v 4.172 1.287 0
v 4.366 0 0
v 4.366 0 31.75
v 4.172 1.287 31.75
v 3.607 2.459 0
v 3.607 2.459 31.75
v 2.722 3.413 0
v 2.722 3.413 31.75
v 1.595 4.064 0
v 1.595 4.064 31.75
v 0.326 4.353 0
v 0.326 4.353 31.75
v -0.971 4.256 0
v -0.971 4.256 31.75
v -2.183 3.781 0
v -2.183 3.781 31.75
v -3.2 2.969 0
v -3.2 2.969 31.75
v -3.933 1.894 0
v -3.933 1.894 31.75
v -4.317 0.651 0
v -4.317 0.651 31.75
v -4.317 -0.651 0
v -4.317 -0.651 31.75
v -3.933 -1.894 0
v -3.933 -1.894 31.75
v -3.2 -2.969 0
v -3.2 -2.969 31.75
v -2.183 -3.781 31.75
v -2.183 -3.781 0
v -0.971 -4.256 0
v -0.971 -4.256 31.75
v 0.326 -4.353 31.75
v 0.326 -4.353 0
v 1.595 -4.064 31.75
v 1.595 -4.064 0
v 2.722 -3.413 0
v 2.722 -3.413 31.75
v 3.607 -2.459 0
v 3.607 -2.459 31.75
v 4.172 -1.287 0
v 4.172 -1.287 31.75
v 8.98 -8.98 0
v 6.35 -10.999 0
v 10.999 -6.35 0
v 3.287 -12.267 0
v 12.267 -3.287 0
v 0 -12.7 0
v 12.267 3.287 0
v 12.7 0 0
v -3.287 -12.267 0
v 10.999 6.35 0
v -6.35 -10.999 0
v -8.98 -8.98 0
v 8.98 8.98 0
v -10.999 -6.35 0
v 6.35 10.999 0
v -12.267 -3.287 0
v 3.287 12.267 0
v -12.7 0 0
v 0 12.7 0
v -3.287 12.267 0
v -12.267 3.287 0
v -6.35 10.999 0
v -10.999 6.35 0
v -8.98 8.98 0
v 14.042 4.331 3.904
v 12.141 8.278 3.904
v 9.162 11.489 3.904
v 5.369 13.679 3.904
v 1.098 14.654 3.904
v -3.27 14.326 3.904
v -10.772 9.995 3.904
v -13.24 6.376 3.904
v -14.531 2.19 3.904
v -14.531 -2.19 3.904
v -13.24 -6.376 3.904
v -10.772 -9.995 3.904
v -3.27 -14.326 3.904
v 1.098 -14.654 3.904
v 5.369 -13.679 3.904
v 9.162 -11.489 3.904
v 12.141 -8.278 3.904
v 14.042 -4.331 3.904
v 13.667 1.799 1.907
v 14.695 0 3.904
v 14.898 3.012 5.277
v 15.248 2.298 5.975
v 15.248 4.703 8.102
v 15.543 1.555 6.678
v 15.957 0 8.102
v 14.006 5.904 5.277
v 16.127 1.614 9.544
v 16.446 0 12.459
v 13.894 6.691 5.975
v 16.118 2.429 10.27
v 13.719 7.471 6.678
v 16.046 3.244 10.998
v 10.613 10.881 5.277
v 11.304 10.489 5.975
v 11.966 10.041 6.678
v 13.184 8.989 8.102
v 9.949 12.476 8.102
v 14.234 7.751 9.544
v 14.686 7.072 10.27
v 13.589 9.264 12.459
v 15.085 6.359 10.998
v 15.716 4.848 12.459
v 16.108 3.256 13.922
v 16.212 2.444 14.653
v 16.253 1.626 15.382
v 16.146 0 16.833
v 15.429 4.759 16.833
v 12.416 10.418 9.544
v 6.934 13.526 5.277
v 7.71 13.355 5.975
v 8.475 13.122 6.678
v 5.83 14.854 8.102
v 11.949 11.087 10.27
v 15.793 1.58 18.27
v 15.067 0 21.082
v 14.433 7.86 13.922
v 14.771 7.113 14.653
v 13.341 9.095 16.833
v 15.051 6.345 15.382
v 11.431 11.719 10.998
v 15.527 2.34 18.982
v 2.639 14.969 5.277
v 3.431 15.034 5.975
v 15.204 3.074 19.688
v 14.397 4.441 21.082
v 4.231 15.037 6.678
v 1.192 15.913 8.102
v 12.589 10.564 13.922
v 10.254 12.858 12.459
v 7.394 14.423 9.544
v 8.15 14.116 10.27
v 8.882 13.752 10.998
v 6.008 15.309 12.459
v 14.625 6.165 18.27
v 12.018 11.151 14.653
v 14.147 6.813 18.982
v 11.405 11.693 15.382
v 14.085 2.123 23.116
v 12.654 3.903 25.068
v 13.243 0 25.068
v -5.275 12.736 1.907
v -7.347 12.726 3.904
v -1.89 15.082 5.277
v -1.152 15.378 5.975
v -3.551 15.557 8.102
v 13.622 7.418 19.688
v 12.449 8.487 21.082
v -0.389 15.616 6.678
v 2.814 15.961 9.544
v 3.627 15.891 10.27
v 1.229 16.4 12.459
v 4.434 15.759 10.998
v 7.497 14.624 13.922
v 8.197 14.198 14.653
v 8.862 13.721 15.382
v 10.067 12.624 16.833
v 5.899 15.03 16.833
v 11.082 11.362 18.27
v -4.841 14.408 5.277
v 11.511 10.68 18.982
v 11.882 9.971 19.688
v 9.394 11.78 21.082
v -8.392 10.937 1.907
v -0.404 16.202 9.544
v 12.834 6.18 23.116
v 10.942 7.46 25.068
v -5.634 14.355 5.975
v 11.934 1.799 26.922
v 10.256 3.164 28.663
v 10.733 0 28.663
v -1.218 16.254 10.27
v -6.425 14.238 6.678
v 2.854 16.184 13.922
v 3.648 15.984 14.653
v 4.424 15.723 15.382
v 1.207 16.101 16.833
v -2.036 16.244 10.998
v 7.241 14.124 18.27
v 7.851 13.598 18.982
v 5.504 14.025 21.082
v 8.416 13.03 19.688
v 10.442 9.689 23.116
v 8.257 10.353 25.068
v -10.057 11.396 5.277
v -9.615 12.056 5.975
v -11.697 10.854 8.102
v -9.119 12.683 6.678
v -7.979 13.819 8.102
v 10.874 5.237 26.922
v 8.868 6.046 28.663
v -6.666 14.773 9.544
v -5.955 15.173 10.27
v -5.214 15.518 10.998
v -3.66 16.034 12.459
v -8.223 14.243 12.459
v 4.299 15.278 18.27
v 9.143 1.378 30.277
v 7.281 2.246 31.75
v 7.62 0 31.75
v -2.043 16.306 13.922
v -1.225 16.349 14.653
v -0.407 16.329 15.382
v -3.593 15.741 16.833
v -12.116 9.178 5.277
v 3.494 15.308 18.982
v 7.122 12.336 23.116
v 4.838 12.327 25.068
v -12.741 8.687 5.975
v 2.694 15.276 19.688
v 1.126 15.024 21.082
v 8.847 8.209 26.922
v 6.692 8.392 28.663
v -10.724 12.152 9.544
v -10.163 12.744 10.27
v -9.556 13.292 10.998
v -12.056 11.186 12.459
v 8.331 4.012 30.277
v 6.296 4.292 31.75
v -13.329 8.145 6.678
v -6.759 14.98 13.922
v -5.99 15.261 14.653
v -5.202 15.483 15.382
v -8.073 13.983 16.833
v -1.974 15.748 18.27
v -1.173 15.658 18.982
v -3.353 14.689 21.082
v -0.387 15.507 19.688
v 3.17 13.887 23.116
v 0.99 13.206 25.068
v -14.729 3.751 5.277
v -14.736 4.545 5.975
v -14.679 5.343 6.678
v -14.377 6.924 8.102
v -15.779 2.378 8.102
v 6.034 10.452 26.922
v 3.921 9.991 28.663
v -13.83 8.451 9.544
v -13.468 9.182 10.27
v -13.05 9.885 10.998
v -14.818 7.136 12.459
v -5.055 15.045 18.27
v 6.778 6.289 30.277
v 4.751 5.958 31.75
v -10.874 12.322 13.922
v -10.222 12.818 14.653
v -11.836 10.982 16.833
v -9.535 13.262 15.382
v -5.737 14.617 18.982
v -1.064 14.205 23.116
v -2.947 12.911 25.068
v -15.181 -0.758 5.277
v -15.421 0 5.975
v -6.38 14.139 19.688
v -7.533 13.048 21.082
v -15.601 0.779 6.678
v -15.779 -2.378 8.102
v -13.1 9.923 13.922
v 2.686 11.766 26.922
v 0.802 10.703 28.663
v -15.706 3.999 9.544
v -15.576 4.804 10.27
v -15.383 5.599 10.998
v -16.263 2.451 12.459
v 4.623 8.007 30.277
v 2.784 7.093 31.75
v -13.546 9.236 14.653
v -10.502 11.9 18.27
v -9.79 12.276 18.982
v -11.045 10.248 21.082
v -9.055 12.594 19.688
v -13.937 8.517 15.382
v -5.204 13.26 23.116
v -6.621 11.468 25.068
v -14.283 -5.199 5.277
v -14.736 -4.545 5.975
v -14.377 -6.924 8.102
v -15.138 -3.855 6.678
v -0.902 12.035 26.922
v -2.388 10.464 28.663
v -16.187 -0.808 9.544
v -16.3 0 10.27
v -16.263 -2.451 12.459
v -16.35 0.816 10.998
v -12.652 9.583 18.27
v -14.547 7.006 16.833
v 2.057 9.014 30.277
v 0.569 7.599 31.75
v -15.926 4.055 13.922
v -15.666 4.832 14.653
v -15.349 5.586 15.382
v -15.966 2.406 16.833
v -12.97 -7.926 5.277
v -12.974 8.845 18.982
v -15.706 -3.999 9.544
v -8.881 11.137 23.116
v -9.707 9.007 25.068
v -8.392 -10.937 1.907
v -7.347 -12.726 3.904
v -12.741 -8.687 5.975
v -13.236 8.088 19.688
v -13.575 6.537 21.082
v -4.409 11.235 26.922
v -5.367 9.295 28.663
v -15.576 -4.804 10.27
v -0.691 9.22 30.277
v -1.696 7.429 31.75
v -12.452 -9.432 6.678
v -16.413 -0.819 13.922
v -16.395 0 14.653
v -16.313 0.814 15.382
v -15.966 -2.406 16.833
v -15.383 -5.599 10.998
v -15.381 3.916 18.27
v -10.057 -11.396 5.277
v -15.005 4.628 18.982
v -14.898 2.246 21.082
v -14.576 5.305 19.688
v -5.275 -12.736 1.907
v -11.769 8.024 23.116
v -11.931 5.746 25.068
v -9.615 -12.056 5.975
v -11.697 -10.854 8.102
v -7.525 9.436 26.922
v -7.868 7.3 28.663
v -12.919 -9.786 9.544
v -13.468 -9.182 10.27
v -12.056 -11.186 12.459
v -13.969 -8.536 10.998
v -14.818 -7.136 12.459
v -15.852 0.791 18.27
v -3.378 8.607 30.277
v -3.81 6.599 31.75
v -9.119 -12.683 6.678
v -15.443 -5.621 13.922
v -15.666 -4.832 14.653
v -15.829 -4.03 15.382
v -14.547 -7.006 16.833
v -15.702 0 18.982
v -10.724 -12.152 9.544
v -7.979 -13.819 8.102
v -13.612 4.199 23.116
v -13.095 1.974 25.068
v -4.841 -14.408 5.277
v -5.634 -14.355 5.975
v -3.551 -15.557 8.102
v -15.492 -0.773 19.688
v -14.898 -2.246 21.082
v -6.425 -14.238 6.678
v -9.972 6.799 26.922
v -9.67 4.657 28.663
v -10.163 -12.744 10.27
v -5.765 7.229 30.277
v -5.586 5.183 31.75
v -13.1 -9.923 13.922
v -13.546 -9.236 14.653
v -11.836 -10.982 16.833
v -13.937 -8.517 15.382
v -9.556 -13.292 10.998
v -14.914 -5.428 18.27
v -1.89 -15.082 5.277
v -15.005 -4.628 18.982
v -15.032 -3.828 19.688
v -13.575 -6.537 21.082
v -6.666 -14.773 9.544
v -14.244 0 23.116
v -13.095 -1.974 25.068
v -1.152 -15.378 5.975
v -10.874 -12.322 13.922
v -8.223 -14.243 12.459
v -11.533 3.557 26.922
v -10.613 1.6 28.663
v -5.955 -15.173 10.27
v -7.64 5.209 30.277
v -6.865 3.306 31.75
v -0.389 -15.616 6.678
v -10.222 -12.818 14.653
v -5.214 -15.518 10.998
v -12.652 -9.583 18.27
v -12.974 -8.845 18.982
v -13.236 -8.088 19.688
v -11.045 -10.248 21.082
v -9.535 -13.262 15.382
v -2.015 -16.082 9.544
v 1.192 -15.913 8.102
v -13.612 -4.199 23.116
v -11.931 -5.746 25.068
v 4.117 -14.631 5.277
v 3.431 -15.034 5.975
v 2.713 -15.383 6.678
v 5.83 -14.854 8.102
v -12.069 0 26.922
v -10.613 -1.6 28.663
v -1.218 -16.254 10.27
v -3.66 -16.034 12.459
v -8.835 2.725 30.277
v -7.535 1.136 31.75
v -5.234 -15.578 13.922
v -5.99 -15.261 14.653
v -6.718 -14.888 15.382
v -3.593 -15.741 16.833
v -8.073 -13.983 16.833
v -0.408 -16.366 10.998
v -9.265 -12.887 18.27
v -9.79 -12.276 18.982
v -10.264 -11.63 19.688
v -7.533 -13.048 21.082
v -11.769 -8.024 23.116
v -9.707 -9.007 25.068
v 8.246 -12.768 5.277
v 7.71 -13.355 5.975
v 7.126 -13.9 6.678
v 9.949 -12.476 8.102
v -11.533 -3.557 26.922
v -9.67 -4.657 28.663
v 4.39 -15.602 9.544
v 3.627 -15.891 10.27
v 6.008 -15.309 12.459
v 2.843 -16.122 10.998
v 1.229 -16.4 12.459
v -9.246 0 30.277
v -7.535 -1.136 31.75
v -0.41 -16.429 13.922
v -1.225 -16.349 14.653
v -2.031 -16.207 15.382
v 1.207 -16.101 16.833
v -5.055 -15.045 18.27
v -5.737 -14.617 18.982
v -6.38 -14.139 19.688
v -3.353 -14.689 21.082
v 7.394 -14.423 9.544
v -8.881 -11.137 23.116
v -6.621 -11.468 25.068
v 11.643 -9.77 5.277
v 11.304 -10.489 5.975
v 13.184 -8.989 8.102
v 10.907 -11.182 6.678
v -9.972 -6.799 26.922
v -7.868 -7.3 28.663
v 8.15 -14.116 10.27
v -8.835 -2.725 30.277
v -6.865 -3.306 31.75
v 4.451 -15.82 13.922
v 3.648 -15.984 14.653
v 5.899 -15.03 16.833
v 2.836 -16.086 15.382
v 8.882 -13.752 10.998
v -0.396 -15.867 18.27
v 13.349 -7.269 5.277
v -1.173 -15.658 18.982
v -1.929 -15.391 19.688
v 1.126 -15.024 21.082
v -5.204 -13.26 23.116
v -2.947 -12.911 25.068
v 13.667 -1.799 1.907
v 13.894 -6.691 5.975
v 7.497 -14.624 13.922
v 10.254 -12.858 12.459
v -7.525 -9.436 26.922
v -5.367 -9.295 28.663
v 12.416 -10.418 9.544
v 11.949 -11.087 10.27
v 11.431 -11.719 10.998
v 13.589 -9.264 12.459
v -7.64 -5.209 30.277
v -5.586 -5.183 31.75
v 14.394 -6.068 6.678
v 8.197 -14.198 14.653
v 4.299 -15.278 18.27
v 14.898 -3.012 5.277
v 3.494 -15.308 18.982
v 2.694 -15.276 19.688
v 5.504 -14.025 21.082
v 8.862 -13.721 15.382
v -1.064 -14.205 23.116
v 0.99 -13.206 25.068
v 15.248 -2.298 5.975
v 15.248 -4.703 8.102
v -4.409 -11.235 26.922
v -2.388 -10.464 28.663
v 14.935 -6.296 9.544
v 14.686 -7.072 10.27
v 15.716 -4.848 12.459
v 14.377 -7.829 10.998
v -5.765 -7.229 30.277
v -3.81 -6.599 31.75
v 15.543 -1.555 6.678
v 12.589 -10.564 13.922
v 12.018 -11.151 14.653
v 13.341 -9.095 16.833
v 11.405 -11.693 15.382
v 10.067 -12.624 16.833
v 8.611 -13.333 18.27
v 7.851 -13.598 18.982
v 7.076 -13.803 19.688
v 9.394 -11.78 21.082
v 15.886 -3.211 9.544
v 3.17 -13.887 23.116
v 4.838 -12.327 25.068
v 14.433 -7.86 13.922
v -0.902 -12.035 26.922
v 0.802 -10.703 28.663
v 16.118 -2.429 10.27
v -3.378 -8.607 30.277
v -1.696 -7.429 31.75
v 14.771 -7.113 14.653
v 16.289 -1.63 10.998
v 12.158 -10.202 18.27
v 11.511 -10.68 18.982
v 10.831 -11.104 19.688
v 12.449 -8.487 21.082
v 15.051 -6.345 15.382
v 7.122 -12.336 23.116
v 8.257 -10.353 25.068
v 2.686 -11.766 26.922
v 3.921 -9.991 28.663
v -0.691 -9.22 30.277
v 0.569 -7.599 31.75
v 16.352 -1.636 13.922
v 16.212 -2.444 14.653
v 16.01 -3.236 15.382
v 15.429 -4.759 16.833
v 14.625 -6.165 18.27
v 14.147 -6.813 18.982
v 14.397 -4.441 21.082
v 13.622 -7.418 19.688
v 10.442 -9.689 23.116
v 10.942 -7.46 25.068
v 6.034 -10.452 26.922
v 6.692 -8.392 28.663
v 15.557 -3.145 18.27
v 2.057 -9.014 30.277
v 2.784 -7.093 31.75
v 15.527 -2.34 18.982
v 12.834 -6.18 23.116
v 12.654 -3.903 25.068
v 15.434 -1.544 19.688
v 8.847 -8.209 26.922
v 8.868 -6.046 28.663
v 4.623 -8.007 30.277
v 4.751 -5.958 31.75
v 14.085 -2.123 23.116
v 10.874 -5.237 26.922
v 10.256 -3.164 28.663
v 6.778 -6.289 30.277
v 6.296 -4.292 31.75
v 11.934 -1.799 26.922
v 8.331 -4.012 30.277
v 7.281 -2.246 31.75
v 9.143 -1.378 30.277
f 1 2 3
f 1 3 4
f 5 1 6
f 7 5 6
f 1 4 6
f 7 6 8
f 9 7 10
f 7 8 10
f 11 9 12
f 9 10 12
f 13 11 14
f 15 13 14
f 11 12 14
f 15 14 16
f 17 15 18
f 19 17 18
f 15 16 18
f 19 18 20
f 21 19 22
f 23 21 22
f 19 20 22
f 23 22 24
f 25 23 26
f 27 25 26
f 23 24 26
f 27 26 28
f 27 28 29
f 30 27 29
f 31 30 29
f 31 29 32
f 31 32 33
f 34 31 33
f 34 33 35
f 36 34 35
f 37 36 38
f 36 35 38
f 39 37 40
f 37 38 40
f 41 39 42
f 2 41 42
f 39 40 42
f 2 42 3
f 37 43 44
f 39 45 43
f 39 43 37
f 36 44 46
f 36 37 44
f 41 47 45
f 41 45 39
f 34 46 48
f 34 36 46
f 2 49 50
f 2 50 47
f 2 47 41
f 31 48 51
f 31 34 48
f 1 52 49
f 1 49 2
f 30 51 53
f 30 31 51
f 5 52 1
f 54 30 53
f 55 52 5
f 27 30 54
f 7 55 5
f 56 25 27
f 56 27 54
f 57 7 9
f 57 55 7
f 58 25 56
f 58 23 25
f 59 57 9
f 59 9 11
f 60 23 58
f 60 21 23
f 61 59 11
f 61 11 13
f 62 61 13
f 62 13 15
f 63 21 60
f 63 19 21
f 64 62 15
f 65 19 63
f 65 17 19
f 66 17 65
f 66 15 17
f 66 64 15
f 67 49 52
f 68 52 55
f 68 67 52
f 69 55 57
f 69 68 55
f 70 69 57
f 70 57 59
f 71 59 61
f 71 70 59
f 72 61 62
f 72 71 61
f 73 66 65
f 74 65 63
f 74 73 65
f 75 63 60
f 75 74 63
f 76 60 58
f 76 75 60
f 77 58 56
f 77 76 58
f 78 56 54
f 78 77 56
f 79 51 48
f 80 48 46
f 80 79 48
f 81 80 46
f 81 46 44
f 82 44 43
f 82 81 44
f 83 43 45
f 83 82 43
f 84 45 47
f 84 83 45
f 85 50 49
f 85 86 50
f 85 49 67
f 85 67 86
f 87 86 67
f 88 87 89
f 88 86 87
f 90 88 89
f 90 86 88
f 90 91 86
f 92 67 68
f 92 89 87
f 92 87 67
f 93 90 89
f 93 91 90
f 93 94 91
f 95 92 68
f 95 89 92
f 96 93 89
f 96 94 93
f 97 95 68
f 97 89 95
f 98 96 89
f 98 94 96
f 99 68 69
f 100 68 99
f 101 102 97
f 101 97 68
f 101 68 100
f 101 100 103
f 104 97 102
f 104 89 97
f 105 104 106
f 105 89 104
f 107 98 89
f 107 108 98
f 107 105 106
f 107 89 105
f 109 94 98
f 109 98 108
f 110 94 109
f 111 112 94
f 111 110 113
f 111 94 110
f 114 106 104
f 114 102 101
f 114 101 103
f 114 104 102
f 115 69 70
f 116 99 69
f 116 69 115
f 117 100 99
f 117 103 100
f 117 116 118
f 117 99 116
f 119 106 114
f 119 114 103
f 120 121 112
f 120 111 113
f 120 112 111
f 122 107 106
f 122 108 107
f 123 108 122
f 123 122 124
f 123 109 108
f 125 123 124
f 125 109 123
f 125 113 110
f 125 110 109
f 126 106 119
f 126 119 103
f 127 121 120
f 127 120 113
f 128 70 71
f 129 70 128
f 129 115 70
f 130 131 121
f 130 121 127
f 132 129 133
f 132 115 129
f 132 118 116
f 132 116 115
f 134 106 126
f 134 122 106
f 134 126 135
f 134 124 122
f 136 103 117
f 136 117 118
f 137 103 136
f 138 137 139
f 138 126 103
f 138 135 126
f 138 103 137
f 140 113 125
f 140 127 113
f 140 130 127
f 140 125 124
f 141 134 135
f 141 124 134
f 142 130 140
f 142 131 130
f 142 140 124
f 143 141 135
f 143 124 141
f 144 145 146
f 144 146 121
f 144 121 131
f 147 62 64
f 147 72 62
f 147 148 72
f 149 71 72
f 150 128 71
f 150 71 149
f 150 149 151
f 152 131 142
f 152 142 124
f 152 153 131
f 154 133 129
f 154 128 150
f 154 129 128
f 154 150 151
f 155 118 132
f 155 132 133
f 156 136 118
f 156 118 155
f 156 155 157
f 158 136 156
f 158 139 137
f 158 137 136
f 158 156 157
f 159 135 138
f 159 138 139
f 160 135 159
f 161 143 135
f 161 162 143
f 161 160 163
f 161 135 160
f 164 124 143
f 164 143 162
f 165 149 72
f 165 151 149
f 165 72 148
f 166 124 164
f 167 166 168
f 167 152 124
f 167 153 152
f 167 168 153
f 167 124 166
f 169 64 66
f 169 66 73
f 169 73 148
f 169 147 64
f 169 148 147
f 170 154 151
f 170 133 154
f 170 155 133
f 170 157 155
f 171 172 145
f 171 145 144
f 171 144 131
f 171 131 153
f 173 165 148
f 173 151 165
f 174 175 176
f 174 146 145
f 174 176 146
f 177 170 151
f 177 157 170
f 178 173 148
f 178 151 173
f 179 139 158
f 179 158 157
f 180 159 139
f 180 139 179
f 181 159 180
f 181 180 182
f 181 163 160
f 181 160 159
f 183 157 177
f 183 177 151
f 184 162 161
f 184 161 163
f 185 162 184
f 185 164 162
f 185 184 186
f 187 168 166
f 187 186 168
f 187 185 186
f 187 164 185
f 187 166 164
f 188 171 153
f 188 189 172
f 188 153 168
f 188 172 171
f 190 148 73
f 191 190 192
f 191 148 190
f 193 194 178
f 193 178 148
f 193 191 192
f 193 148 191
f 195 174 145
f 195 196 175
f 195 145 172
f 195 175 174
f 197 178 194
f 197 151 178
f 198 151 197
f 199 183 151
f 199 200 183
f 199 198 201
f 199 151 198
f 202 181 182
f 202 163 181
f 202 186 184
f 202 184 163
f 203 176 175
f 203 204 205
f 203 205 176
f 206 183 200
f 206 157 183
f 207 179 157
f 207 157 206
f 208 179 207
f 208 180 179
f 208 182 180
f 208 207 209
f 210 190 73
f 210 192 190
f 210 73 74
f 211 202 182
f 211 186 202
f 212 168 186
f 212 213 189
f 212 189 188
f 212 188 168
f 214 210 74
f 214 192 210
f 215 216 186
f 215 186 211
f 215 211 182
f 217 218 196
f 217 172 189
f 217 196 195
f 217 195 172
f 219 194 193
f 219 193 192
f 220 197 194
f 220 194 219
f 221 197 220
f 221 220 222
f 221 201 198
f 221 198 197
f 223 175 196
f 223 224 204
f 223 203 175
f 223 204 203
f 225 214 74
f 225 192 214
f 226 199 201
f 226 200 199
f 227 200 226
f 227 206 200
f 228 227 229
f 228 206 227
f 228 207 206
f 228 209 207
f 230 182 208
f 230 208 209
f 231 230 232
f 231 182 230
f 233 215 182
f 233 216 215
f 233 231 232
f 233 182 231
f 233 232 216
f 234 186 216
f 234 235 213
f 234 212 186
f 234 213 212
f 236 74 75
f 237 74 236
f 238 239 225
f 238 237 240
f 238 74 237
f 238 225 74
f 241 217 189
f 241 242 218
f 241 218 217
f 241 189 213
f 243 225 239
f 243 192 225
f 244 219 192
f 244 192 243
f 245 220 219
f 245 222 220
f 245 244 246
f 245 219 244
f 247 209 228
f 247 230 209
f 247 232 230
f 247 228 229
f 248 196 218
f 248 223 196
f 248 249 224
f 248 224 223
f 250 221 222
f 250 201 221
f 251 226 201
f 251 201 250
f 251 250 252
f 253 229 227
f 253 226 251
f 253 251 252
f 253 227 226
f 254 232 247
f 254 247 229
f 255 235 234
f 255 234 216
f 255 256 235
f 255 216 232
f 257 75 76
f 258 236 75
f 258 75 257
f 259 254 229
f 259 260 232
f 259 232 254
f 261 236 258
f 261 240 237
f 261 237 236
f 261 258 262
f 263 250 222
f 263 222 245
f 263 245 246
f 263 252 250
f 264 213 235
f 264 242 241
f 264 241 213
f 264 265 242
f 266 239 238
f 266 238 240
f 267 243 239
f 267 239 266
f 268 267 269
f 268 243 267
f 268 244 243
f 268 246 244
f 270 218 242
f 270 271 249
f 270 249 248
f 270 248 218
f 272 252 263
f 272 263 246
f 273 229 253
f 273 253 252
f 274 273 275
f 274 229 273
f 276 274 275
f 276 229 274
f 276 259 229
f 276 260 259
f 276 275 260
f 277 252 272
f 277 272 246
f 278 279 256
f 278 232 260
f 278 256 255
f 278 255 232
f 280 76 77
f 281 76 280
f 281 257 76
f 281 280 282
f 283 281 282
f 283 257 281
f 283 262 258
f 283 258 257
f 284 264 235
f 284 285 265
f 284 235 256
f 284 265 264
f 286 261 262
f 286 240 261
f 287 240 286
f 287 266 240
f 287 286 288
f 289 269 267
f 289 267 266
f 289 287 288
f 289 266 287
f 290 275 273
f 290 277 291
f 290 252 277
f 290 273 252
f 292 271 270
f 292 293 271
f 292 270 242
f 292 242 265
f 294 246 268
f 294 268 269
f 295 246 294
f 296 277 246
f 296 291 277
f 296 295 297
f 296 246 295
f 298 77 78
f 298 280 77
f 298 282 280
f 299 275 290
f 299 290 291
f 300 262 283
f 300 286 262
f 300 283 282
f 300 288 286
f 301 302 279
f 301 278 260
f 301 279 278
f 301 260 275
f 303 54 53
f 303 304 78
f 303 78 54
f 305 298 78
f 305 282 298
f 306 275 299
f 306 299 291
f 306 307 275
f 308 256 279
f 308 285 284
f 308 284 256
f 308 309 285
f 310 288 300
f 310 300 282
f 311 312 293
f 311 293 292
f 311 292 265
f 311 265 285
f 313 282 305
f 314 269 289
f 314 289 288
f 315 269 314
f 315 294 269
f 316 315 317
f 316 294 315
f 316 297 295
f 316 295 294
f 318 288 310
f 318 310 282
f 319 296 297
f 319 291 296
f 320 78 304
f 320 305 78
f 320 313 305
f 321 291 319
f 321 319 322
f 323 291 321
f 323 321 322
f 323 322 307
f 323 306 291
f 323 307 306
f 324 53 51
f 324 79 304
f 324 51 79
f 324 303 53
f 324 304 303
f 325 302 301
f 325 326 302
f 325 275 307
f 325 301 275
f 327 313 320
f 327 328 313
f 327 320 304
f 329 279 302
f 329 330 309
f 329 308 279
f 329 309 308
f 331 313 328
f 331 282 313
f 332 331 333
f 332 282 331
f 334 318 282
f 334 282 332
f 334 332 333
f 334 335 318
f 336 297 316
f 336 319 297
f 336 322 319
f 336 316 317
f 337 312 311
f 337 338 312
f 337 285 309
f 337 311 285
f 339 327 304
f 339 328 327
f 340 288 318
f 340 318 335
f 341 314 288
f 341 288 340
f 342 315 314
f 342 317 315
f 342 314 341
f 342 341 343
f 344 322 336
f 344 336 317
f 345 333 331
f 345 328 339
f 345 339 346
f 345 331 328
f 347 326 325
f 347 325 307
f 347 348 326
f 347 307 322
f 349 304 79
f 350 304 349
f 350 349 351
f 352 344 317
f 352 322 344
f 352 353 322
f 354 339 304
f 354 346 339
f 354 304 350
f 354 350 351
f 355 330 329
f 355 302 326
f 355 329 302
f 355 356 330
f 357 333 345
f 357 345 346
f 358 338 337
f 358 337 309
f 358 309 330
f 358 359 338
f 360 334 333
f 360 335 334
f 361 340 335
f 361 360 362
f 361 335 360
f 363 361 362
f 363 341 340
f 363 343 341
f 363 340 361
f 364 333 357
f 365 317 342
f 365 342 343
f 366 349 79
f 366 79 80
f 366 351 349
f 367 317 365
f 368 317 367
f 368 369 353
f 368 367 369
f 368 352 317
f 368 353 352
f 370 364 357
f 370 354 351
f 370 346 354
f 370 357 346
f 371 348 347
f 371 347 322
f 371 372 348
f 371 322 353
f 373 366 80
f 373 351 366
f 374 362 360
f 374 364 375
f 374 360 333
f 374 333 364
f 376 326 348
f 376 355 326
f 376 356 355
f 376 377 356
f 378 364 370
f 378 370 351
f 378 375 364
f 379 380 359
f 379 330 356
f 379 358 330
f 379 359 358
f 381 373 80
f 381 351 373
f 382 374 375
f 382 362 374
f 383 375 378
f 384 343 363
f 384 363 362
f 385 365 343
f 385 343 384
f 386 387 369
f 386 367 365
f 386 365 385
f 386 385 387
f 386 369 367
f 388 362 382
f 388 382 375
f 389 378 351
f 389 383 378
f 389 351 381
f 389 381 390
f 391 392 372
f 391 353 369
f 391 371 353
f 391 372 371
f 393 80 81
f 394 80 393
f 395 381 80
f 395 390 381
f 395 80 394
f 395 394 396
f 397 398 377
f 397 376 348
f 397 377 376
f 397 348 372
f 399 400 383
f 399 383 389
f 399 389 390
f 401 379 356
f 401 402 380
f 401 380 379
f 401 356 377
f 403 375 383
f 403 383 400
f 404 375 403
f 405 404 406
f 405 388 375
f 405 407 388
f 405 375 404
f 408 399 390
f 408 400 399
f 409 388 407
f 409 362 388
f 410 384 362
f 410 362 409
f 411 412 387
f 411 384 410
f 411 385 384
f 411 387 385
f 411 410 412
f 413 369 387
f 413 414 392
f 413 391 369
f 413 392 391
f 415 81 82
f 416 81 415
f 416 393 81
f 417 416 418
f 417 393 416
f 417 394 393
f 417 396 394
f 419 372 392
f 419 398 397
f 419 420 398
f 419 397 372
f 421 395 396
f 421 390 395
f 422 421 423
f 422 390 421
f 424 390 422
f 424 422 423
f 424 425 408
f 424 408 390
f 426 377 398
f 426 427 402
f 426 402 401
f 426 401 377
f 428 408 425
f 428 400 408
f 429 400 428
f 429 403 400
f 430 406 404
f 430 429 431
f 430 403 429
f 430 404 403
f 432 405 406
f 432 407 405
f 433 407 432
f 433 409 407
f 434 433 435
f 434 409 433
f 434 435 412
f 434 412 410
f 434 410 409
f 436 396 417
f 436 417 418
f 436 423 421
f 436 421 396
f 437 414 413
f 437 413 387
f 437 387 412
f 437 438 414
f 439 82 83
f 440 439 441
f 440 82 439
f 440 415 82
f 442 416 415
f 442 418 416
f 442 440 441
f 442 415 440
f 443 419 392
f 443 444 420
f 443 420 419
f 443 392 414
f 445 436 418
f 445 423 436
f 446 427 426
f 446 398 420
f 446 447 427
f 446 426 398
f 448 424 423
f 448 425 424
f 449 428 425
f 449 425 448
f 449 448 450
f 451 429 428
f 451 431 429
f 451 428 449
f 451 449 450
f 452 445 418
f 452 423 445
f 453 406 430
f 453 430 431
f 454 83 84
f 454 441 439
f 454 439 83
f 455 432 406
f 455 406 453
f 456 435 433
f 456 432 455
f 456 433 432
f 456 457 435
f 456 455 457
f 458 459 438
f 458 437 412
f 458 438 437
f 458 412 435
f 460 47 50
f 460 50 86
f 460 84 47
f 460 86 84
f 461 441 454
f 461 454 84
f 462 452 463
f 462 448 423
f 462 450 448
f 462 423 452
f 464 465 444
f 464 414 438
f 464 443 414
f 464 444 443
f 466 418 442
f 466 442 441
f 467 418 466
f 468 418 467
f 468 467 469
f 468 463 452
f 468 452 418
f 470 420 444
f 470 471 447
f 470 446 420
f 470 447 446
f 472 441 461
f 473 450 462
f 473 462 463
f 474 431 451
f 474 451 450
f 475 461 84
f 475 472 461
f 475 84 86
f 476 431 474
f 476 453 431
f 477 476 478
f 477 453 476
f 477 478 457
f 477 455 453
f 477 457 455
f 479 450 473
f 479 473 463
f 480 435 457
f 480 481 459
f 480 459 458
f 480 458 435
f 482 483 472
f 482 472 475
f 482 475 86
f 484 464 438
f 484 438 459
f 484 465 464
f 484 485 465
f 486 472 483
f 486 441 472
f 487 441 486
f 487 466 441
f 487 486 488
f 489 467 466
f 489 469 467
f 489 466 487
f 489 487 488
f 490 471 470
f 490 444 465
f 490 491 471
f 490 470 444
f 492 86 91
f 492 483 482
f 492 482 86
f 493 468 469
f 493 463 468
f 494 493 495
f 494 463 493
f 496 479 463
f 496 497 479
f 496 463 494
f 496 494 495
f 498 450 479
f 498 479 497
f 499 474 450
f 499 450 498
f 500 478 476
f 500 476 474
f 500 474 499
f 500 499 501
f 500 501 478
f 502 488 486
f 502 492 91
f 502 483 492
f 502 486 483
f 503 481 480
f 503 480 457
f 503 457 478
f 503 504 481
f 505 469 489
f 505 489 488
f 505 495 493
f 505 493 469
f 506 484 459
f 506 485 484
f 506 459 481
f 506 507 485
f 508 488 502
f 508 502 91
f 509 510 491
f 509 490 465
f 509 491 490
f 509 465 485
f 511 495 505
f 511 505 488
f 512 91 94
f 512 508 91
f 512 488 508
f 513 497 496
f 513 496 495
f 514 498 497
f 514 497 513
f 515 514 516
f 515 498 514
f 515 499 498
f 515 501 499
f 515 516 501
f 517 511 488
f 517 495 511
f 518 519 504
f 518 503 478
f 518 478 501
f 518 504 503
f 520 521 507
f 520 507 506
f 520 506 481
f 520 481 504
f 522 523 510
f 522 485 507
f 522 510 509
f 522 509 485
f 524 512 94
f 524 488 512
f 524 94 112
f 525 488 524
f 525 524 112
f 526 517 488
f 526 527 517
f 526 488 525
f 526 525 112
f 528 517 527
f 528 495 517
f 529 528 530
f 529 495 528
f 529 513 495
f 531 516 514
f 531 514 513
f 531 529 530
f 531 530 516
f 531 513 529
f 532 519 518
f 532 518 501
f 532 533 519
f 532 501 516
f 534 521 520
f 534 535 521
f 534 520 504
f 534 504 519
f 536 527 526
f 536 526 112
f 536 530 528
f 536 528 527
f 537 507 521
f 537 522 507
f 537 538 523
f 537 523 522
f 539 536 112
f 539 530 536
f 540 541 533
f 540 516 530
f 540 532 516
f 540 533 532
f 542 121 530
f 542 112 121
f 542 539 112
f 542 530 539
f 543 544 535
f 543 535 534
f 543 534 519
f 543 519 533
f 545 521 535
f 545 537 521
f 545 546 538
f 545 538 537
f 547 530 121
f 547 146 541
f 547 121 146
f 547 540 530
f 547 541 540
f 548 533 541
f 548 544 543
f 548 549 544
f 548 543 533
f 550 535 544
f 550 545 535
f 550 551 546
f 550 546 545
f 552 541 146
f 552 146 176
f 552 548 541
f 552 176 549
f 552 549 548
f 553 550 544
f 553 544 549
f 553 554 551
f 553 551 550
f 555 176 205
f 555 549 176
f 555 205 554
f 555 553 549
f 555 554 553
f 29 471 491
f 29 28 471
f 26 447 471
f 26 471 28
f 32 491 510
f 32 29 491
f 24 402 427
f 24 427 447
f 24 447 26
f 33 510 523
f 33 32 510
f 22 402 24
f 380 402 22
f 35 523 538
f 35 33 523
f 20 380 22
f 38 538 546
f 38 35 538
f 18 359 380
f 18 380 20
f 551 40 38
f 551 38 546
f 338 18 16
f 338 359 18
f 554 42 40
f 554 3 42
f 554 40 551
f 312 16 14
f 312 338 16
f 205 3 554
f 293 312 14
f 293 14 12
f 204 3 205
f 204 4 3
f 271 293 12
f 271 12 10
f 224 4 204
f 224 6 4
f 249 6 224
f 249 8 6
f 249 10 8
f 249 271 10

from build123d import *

# Parameters (mm, degrees)
F2_R      = 4.365625
F3_DEPTH  = 25.4
F3_FACE_R = 4.365625
F4_DEPTH  = 25.4


with BuildPart() as f1:
    # F0 (on Front) → F1 (revolve)
    with BuildSketch(Plane.XZ):
        with BuildLine():
            Line((0, 31.75), (0, 0))
            Line((0, 0), (12.7, 0))
            ThreePointArc((12.7, 0), (16.14612, 16.832779), (7.62, 31.75))
            Line((7.62, 31.75), (0, 31.75))
        make_face()
    revolve(axis=Axis((0, 0, 15.875), (0, 0, 1)))

    # F2 (on face) → F3 (cut)
    with BuildSketch(Plane.XY.offset(31.75)):
        Circle(F2_R)
    extrude(amount=-F3_DEPTH, mode=Mode.SUBTRACT)

    # F3_face (on face) → F4 (cut)
    with BuildSketch(Plane.XY.offset(6.35)):
        Circle(F3_FACE_R)
    extrude(amount=-F4_DEPTH, mode=Mode.SUBTRACT)


solid = f1.part
